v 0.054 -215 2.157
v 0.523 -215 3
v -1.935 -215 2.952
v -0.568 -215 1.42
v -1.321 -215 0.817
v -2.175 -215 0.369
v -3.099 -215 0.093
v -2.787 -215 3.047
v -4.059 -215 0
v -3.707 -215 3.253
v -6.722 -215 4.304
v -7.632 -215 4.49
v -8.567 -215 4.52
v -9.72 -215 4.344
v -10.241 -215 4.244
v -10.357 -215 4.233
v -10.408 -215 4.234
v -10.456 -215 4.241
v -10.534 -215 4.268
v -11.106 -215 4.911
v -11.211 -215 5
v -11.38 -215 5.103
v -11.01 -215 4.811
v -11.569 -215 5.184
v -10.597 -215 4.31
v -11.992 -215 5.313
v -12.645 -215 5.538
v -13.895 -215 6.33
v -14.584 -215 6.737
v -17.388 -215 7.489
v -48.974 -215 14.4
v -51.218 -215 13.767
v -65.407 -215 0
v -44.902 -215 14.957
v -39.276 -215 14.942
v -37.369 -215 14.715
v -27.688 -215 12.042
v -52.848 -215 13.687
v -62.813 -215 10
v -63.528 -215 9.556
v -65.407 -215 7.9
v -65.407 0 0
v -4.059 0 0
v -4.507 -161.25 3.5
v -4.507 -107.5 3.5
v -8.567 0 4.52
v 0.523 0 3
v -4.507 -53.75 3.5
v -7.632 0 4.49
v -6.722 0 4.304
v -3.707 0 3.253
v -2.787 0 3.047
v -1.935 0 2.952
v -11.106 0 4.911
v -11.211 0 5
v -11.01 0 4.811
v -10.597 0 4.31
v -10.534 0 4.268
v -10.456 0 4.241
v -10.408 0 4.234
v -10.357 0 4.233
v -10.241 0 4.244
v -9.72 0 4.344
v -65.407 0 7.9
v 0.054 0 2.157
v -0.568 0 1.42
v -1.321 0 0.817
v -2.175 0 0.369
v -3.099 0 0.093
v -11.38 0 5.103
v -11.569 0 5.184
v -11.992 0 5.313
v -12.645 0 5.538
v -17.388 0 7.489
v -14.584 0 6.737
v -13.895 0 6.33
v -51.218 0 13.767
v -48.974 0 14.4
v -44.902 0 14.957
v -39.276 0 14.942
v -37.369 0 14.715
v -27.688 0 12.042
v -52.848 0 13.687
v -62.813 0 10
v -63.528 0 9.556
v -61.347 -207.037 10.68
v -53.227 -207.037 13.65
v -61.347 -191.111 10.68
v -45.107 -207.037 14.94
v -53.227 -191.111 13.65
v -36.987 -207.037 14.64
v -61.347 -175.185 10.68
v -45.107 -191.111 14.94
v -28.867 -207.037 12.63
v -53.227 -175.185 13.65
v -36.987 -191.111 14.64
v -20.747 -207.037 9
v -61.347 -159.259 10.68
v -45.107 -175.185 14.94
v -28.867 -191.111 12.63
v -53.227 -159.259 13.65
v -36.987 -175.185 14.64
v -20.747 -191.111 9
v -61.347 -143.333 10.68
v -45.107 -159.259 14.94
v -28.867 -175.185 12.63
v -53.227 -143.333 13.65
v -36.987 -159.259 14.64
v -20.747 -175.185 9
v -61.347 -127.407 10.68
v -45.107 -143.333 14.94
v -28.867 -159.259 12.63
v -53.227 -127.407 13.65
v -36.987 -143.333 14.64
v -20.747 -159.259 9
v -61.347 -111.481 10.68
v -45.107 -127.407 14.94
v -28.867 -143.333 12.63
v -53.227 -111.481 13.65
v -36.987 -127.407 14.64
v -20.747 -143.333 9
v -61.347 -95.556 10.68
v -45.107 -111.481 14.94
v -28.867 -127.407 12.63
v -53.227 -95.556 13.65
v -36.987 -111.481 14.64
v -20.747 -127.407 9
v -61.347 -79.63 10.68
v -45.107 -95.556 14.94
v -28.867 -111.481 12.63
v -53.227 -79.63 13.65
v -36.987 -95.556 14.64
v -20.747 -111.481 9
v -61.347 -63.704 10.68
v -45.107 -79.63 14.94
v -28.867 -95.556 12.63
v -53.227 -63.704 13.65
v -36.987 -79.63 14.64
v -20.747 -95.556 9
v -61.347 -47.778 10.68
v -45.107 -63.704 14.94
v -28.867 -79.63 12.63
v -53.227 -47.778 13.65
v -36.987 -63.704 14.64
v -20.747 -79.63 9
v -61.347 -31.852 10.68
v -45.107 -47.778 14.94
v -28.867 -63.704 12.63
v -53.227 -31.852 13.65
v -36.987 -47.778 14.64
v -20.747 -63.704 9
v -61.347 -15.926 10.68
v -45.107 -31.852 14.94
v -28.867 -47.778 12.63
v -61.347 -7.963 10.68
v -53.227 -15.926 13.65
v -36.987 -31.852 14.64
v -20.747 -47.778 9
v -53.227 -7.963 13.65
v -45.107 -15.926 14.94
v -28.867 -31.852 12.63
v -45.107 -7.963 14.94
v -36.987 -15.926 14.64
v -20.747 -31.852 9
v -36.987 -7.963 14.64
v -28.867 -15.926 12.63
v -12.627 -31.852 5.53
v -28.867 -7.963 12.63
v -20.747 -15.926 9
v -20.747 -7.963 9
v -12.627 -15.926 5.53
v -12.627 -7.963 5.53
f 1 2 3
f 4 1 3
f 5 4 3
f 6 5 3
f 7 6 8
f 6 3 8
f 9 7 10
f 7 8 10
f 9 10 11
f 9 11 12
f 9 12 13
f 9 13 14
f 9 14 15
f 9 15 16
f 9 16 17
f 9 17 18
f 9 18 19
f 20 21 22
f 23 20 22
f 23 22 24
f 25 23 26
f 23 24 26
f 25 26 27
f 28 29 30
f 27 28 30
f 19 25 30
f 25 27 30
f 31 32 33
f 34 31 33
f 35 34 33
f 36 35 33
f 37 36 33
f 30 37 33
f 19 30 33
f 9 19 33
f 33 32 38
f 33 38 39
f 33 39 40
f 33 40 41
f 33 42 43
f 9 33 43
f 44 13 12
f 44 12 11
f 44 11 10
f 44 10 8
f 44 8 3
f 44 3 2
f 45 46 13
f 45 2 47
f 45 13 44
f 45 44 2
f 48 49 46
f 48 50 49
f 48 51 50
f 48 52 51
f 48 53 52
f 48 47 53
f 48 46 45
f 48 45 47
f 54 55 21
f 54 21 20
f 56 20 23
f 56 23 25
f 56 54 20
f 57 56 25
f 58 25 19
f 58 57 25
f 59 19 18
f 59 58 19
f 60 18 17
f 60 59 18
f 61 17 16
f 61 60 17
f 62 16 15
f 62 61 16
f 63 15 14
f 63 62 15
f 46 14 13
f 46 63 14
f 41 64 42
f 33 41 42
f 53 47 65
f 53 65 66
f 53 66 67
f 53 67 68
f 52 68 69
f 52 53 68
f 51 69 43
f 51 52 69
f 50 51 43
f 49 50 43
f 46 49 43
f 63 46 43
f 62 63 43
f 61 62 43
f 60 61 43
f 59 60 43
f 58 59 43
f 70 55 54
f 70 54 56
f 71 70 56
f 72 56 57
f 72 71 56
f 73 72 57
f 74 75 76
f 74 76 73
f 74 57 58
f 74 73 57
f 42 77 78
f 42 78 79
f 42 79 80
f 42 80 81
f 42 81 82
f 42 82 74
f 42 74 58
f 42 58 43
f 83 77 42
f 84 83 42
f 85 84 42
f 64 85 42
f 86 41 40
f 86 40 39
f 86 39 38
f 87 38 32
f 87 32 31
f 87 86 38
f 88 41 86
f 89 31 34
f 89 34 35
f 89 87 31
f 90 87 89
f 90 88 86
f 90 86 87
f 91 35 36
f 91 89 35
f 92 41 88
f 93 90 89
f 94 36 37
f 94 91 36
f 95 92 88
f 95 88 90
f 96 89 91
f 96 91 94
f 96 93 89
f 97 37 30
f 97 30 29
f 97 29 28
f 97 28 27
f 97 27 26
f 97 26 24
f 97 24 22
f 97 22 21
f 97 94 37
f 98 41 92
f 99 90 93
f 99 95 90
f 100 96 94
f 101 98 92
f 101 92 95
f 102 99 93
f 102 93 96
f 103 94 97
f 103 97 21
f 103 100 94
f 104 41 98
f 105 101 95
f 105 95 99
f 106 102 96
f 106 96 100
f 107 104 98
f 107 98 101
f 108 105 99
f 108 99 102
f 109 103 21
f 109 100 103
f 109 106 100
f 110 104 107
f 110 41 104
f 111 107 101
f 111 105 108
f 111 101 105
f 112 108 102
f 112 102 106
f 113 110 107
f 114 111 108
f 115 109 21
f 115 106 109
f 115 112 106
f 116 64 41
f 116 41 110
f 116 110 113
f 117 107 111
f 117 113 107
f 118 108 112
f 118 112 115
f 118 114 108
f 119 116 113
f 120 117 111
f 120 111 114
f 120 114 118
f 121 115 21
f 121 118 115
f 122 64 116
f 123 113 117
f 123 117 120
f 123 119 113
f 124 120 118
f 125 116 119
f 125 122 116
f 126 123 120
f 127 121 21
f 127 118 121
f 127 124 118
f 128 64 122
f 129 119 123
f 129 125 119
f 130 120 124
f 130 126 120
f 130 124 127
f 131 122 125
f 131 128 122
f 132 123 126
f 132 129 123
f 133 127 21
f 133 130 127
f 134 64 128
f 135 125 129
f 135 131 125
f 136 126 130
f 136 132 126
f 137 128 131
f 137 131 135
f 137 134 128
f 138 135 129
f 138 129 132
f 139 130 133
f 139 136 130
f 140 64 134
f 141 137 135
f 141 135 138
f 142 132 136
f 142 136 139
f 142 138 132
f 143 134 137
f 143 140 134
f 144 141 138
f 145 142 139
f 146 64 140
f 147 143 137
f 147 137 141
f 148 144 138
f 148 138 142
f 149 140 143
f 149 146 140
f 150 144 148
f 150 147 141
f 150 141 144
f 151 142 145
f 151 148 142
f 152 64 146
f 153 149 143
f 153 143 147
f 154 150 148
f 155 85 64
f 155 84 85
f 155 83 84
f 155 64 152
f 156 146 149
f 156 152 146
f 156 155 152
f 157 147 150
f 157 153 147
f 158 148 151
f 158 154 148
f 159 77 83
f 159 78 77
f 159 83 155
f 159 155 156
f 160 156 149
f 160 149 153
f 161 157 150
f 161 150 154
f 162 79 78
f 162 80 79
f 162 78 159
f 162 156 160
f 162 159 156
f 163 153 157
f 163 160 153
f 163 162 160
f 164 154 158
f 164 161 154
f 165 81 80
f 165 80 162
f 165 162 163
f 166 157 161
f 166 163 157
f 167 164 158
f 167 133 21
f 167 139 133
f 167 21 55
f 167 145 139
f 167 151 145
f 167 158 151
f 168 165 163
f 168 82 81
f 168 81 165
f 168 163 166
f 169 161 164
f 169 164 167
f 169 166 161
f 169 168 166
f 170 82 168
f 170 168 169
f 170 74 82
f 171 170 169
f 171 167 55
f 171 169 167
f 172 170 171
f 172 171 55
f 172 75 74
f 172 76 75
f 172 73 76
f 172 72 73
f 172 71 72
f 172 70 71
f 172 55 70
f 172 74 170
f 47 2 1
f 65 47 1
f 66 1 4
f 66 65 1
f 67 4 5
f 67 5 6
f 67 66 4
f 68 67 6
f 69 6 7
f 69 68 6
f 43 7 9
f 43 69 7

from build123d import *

# Parameters (mm, degrees)
F1_DEPTH    = 215
F2_T1_DEPTH = 237.9128784748


# Not quite as in the source:
# - a fillet or chamfer that OpenCascade refuses, or shapes differently, is made with other operations: its cross-section is extruded or revolved along the edge and cut away or added


with BuildPart() as f1:
    # F0 (on Front) → F1 (new body)
    with BuildSketch(Plane.XZ):
        with BuildLine():
            add(Edge.make_bspline(
                [(-65.4067975488, 7.9), (-64.7446827642, 8.5441405082), (-63.477396389, 9.7770241543), (-61.3556983755, 10.6763060463), (-59.3261192012, 11.536081627), (-57.2882532943, 12.2802882653), (-55.2594103899, 12.9664310821), (-53.2594358742, 13.8360781513), (-51.1660118118, 13.5695464853), (-49.1928290211, 14.5178863994), (-47.1276857108, 14.506671967), (-45.1170711888, 15.0563899138), (-43.075192109, 14.9051977862), (-41.0476544737, 14.9031676075), (-39.0115486283, 15.0022986162), (-36.9779374337, 14.6654074526), (-34.9572495613, 14.1678726088), (-32.91324085, 13.7384022898), (-30.9210670552, 12.9504590852), (-28.7989996539, 12.8276635908), (-26.8826100013, 11.4491985592), (-24.7948716824, 10.8991034099), (-22.7490904289, 10.1024848406), (-20.7688732719, 8.9435573213), (-18.7126441336, 8.148796087), (-16.7299758299, 7.0842785912), (-14.5717633458, 7.0488862609), (-12.7638127336, 5.3273663002), (-11.5660546149, 5.2626631044), (-11.2112825736, 5)],
                knots=[0, 0, 0, 0, 0.0338753916, 0.0650257007, 0.0956580751, 0.1260648577, 0.1564155231, 0.1865884769, 0.21605978, 0.2461084444, 0.2756564169, 0.3053063957, 0.3347521875, 0.3641979794, 0.3936437713, 0.423238481, 0.4530550197, 0.4829374078, 0.513045091, 0.5428174627, 0.574061051, 0.604391979, 0.6349455091, 0.6661890973, 0.6969857938, 0.7276449479, 0.7574937799, 0.7893686126, 0.8147768362, 0.8147768362, 0.8147768362, 0.8147768362], degree=3))
            Line((-65.4067975488, 7.9), (-65.4067975488, 0))
            Line((-65.4067975488, 0), (0.5232024512, 0))
            Line((0.5232024512, 0), (0.5232024512, 3))
            add(Edge.make_bspline(
                [(-8.5667975488, 4.52), (-7.8700649184, 4.5654690193), (-6.5006401691, 4.3350148914), (-4.5552721521, 3.4462995441), (-2.2420579262, 2.8648207953), (-1.1070154242, 2.947469133), (0.5232024512, 3)],
                knots=[0.8743439824, 0.8743439824, 0.8743439824, 0.8743439824, 0.903918966, 0.934321718, 0.9642041061, 1, 1, 1, 1], degree=3))
            add(Edge.make_bspline(
                [(-11.2112825736, 5), (-10.933856182, 4.7946014094), (-10.6523620488, 4.2158777781), (-10.1538388519, 4.2262545919), (-9.192728764, 4.4791515062), (-8.5667975488, 4.52)],
                knots=[0.8147768362, 0.8147768362, 0.8147768362, 0.8147768362, 0.8346456843, 0.847774385, 0.8743439824, 0.8743439824, 0.8743439824, 0.8743439824], degree=3))
        make_face()
    extrude(amount=F1_DEPTH)

    # F2: fillet of radius 5 on 1 edges, made by hand

    # F2_s2 → F2_t1 (cut)
    with BuildSketch(Plane.XZ.offset(-11.4564392374)):
        with BuildLine():
            ThreePointArc((0.5232024512, 3), (-1.3207604562, 0.8166998673), (-4.0593732438, 0))
            Line((-4.0593732438, 0), (0.5232024512, 0))
            Line((0.5232024512, 0), (0.5232024512, 3))
        make_face()
    extrude(amount=F2_T1_DEPTH, mode=Mode.SUBTRACT)


solid = f1.part
